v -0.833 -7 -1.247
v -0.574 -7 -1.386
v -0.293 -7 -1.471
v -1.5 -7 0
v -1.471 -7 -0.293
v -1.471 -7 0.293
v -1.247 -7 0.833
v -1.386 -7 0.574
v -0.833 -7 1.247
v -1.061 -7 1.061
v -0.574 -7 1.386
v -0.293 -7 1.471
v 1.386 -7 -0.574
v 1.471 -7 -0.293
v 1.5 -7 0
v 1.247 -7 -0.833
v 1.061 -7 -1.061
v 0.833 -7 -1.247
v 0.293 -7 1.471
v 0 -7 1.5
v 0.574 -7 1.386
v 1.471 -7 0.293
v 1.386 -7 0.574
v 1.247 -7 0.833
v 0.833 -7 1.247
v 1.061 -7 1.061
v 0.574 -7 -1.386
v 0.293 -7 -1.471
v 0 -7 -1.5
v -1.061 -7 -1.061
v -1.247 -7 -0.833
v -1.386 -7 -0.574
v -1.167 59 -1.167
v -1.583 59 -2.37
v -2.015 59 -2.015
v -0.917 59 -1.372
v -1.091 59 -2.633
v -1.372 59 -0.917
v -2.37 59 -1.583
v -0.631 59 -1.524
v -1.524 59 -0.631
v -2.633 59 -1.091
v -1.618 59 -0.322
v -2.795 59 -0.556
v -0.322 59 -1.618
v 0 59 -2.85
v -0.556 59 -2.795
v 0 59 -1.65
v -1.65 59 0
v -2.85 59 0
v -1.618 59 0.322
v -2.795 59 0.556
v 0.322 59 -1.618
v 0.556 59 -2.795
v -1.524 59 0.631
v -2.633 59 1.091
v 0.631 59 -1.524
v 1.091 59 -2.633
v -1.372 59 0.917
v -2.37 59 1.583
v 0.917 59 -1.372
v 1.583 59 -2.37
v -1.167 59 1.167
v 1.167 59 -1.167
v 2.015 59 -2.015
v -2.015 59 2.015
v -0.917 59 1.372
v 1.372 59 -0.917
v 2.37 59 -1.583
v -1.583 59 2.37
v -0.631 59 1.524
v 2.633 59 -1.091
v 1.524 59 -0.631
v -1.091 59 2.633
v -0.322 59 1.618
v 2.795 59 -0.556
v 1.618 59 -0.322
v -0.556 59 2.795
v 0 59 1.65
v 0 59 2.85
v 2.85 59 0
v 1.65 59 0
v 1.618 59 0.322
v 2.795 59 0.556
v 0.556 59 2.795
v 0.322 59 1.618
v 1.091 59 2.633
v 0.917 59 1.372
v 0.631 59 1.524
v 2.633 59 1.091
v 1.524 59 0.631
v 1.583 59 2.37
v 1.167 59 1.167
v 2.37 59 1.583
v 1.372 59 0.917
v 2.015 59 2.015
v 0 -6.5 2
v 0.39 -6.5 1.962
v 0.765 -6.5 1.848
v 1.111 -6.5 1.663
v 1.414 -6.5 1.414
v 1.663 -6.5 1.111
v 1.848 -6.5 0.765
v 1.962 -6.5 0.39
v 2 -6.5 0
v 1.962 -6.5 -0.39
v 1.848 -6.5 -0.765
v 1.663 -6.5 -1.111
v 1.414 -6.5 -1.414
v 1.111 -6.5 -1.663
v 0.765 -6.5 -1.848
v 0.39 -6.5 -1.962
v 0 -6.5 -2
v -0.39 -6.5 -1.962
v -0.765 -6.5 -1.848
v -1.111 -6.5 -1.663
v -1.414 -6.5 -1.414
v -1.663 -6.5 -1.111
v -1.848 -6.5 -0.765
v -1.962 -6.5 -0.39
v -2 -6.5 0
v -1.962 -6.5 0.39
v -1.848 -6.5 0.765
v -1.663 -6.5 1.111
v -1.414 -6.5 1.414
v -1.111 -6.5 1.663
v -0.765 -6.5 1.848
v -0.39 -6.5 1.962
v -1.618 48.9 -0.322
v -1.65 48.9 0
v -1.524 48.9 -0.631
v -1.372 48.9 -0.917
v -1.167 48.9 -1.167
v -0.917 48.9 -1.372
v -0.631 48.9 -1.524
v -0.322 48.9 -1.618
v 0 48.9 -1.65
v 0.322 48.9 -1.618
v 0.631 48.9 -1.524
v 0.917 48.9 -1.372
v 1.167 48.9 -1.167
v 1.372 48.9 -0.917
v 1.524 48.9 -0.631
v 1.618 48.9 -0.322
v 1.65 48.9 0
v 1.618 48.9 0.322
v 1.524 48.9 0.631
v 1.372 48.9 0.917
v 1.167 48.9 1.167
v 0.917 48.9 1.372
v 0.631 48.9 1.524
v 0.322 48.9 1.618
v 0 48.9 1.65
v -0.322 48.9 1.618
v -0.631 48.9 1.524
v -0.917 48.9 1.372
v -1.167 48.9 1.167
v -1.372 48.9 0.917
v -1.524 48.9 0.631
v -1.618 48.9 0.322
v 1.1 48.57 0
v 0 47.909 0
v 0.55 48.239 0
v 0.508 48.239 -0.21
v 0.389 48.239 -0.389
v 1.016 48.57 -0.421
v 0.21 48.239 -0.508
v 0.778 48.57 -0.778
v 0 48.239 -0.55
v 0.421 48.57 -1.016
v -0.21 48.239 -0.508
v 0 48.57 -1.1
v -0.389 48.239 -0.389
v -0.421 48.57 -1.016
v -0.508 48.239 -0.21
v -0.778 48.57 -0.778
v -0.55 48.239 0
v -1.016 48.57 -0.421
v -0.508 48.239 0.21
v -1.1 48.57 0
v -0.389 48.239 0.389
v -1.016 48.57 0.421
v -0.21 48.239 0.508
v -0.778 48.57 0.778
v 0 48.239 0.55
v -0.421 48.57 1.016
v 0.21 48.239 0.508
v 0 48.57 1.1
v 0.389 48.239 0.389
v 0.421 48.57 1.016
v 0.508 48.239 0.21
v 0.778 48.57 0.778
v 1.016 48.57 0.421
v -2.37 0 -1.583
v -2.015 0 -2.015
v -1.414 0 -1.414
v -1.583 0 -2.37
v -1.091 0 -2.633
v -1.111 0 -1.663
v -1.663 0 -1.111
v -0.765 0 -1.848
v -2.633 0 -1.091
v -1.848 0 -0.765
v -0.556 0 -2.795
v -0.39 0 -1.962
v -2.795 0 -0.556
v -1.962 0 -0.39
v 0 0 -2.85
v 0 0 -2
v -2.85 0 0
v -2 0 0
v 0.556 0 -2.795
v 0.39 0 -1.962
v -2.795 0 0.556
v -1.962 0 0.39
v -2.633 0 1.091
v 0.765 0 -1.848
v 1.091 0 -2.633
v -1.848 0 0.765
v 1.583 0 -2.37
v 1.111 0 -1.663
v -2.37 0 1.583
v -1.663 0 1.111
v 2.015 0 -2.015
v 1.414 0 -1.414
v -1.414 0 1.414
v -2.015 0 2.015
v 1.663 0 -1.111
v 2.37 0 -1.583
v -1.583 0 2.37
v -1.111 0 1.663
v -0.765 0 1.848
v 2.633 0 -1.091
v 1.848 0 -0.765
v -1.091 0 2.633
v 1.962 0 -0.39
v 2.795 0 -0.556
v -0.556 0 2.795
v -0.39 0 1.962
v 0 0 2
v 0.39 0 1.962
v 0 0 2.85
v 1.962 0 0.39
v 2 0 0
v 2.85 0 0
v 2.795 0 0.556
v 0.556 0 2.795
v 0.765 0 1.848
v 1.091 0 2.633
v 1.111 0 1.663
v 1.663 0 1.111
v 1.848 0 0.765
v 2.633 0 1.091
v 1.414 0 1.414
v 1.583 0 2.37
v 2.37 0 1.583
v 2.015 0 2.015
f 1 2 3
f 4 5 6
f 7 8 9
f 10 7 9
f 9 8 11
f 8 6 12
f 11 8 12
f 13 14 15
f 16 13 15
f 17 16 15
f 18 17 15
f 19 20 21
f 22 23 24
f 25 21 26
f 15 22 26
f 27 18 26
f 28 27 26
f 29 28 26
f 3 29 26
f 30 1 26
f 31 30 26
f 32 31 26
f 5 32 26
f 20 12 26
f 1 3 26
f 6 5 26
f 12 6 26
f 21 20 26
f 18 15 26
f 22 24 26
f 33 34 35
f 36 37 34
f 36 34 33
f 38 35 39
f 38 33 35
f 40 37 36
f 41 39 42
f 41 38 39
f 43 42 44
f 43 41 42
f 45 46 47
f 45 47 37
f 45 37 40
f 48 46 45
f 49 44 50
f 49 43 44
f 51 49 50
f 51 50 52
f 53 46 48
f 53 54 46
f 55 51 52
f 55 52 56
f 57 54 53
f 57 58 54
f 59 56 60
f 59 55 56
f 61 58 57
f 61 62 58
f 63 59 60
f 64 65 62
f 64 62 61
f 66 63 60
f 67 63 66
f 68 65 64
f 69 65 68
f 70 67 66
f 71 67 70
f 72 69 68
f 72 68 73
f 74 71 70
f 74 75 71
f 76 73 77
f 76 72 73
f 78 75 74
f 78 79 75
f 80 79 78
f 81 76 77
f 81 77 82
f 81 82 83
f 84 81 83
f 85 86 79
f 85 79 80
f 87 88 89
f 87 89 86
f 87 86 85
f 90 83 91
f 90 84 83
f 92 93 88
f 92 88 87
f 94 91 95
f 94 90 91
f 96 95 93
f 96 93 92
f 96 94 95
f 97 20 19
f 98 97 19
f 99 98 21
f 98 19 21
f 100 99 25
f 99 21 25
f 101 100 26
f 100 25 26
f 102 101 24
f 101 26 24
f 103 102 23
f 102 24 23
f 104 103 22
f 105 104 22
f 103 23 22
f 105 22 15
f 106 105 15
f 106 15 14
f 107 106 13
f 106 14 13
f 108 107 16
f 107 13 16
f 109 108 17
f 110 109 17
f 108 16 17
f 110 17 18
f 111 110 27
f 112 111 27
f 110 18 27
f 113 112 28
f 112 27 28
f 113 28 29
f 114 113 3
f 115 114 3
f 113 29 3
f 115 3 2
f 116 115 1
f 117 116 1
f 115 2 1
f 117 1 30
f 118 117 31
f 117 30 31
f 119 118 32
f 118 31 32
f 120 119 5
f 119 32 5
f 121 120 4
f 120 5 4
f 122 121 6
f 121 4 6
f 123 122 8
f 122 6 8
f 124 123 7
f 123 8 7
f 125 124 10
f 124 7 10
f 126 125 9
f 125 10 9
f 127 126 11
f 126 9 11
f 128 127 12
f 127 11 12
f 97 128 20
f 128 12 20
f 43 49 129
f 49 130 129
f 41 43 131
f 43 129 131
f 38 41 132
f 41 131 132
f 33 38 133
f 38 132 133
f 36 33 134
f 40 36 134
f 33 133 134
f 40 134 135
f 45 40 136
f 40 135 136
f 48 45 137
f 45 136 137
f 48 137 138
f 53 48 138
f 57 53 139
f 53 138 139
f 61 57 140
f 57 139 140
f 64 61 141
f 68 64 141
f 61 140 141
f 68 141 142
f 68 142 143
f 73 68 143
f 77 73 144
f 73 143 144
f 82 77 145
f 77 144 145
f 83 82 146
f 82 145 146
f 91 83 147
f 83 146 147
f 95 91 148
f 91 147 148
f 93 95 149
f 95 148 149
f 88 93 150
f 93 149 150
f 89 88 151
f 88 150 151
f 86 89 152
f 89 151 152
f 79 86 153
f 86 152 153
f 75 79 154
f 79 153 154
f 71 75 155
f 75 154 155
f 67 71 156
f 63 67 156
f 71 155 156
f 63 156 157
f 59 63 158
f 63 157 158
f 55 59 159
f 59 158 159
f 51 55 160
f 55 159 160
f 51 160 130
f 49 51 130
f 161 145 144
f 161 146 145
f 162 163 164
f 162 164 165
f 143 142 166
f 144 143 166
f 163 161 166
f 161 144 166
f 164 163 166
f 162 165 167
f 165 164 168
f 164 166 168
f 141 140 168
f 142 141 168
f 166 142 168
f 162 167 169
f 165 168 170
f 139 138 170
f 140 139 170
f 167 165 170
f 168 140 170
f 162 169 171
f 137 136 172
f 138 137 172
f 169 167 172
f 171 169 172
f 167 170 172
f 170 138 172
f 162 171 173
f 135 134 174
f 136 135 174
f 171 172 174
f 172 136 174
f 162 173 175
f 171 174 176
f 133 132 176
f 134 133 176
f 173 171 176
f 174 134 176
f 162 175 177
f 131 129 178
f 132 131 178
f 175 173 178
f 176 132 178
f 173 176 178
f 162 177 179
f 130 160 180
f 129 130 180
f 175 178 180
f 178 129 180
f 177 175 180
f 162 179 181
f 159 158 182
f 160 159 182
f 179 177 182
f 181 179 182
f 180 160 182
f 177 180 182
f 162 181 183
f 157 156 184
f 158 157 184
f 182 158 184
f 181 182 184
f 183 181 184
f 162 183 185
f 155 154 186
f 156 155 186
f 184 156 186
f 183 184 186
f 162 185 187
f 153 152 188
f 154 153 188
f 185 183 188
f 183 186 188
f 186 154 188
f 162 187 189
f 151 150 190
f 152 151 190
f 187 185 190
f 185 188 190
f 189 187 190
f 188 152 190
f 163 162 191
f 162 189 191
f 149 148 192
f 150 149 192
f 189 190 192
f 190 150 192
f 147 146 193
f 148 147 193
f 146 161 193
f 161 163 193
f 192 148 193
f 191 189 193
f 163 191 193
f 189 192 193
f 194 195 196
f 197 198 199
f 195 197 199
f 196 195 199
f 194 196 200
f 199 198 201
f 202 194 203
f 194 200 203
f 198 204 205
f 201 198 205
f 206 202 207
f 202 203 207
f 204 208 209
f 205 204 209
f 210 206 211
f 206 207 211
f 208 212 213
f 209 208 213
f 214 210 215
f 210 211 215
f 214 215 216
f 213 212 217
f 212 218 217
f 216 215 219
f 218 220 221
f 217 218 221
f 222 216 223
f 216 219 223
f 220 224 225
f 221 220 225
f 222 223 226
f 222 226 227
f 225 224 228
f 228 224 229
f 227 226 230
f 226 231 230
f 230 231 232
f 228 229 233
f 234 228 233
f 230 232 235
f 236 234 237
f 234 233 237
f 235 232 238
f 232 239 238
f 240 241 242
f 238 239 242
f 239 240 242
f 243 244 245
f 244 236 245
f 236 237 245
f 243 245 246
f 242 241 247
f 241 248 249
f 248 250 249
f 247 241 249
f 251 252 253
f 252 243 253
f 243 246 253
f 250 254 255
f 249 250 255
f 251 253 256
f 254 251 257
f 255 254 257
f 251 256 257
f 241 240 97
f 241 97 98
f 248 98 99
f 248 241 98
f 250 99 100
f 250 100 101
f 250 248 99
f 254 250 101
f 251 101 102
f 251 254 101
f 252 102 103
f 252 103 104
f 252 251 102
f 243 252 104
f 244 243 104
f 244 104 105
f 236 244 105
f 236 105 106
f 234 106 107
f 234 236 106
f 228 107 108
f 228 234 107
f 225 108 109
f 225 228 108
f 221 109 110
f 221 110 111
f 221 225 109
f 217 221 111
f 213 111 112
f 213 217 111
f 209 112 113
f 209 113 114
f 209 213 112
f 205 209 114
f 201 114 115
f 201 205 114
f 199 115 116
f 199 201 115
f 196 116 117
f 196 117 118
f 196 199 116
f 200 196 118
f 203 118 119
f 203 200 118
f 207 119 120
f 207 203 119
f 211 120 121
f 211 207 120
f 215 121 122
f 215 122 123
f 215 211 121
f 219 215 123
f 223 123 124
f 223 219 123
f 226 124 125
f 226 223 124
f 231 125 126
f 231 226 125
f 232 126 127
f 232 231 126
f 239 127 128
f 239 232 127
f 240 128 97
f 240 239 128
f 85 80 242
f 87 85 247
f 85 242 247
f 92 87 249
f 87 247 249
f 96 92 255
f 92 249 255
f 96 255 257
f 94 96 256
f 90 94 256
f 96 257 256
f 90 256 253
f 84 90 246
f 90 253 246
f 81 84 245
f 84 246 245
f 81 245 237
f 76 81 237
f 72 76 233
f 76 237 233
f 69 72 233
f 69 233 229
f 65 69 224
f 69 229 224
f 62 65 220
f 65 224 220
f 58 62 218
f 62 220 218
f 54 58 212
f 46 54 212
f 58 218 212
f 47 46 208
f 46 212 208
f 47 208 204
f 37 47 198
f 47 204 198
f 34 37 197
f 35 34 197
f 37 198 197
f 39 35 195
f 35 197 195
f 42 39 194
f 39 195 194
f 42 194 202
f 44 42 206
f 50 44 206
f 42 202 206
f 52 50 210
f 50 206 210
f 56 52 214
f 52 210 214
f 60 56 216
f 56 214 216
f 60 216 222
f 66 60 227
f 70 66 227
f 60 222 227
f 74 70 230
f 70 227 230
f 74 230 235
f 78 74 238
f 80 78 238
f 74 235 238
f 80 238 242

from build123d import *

# Parameters (mm, degrees)
SKETCH1_R                 = 2.85
BOSS_EXTRUDE1_DEPTH       = 59
SKETCH1_4_R               = 2
BOSS_EXTRUDE2_DEPTH       = 7
M4X0_7_TAPPED_HOLE1_D     = 3.3
M4X0_7_TAPPED_HOLE1_DEPTH = 10.1
M4X0_7_TAPPED_HOLE1_TIP   = 0.991420021
CHAMFER1_SIZE             = 0.5


with BuildPart() as part:
    # Sketch1 → Boss-Extrude1 (new body)
    with BuildSketch(Plane(origin=(0, 0, 0), x_dir=(1, 0, 0), z_dir=(0, 1, 0))):
        Circle(SKETCH1_R)
    extrude(amount=BOSS_EXTRUDE1_DEPTH)

    # Sketch1<4> → Boss-Extrude2 (add)
    with BuildSketch(Plane(origin=(0, 0, 0), x_dir=(1, 0, 0), z_dir=(0, 1, 0))):
        Circle(SKETCH1_4_R)
    extrude(amount=-BOSS_EXTRUDE2_DEPTH)

    # M4x0.7 Tapped Hole1
    with Locations(Plane(origin=(0, 59, 0), x_dir=(1, 0, 0), z_dir=(0, 1, 0))):
        with Locations((0, 0)):
            Hole(M4X0_7_TAPPED_HOLE1_D / 2, depth=M4X0_7_TAPPED_HOLE1_DEPTH)
            with Locations((0, 0, -(M4X0_7_TAPPED_HOLE1_DEPTH + M4X0_7_TAPPED_HOLE1_TIP / 2))):  # 118° drill point
                Cone(0, M4X0_7_TAPPED_HOLE1_D / 2, M4X0_7_TAPPED_HOLE1_TIP, mode=Mode.SUBTRACT)

    # Chamfer1
    chamfer1_edges = [part.edges().sort_by_distance(p)[0] for p in [
        (-2, -7, 0),
    ]]
    chamfer(chamfer1_edges, length=CHAMFER1_SIZE)


solid = part.part
